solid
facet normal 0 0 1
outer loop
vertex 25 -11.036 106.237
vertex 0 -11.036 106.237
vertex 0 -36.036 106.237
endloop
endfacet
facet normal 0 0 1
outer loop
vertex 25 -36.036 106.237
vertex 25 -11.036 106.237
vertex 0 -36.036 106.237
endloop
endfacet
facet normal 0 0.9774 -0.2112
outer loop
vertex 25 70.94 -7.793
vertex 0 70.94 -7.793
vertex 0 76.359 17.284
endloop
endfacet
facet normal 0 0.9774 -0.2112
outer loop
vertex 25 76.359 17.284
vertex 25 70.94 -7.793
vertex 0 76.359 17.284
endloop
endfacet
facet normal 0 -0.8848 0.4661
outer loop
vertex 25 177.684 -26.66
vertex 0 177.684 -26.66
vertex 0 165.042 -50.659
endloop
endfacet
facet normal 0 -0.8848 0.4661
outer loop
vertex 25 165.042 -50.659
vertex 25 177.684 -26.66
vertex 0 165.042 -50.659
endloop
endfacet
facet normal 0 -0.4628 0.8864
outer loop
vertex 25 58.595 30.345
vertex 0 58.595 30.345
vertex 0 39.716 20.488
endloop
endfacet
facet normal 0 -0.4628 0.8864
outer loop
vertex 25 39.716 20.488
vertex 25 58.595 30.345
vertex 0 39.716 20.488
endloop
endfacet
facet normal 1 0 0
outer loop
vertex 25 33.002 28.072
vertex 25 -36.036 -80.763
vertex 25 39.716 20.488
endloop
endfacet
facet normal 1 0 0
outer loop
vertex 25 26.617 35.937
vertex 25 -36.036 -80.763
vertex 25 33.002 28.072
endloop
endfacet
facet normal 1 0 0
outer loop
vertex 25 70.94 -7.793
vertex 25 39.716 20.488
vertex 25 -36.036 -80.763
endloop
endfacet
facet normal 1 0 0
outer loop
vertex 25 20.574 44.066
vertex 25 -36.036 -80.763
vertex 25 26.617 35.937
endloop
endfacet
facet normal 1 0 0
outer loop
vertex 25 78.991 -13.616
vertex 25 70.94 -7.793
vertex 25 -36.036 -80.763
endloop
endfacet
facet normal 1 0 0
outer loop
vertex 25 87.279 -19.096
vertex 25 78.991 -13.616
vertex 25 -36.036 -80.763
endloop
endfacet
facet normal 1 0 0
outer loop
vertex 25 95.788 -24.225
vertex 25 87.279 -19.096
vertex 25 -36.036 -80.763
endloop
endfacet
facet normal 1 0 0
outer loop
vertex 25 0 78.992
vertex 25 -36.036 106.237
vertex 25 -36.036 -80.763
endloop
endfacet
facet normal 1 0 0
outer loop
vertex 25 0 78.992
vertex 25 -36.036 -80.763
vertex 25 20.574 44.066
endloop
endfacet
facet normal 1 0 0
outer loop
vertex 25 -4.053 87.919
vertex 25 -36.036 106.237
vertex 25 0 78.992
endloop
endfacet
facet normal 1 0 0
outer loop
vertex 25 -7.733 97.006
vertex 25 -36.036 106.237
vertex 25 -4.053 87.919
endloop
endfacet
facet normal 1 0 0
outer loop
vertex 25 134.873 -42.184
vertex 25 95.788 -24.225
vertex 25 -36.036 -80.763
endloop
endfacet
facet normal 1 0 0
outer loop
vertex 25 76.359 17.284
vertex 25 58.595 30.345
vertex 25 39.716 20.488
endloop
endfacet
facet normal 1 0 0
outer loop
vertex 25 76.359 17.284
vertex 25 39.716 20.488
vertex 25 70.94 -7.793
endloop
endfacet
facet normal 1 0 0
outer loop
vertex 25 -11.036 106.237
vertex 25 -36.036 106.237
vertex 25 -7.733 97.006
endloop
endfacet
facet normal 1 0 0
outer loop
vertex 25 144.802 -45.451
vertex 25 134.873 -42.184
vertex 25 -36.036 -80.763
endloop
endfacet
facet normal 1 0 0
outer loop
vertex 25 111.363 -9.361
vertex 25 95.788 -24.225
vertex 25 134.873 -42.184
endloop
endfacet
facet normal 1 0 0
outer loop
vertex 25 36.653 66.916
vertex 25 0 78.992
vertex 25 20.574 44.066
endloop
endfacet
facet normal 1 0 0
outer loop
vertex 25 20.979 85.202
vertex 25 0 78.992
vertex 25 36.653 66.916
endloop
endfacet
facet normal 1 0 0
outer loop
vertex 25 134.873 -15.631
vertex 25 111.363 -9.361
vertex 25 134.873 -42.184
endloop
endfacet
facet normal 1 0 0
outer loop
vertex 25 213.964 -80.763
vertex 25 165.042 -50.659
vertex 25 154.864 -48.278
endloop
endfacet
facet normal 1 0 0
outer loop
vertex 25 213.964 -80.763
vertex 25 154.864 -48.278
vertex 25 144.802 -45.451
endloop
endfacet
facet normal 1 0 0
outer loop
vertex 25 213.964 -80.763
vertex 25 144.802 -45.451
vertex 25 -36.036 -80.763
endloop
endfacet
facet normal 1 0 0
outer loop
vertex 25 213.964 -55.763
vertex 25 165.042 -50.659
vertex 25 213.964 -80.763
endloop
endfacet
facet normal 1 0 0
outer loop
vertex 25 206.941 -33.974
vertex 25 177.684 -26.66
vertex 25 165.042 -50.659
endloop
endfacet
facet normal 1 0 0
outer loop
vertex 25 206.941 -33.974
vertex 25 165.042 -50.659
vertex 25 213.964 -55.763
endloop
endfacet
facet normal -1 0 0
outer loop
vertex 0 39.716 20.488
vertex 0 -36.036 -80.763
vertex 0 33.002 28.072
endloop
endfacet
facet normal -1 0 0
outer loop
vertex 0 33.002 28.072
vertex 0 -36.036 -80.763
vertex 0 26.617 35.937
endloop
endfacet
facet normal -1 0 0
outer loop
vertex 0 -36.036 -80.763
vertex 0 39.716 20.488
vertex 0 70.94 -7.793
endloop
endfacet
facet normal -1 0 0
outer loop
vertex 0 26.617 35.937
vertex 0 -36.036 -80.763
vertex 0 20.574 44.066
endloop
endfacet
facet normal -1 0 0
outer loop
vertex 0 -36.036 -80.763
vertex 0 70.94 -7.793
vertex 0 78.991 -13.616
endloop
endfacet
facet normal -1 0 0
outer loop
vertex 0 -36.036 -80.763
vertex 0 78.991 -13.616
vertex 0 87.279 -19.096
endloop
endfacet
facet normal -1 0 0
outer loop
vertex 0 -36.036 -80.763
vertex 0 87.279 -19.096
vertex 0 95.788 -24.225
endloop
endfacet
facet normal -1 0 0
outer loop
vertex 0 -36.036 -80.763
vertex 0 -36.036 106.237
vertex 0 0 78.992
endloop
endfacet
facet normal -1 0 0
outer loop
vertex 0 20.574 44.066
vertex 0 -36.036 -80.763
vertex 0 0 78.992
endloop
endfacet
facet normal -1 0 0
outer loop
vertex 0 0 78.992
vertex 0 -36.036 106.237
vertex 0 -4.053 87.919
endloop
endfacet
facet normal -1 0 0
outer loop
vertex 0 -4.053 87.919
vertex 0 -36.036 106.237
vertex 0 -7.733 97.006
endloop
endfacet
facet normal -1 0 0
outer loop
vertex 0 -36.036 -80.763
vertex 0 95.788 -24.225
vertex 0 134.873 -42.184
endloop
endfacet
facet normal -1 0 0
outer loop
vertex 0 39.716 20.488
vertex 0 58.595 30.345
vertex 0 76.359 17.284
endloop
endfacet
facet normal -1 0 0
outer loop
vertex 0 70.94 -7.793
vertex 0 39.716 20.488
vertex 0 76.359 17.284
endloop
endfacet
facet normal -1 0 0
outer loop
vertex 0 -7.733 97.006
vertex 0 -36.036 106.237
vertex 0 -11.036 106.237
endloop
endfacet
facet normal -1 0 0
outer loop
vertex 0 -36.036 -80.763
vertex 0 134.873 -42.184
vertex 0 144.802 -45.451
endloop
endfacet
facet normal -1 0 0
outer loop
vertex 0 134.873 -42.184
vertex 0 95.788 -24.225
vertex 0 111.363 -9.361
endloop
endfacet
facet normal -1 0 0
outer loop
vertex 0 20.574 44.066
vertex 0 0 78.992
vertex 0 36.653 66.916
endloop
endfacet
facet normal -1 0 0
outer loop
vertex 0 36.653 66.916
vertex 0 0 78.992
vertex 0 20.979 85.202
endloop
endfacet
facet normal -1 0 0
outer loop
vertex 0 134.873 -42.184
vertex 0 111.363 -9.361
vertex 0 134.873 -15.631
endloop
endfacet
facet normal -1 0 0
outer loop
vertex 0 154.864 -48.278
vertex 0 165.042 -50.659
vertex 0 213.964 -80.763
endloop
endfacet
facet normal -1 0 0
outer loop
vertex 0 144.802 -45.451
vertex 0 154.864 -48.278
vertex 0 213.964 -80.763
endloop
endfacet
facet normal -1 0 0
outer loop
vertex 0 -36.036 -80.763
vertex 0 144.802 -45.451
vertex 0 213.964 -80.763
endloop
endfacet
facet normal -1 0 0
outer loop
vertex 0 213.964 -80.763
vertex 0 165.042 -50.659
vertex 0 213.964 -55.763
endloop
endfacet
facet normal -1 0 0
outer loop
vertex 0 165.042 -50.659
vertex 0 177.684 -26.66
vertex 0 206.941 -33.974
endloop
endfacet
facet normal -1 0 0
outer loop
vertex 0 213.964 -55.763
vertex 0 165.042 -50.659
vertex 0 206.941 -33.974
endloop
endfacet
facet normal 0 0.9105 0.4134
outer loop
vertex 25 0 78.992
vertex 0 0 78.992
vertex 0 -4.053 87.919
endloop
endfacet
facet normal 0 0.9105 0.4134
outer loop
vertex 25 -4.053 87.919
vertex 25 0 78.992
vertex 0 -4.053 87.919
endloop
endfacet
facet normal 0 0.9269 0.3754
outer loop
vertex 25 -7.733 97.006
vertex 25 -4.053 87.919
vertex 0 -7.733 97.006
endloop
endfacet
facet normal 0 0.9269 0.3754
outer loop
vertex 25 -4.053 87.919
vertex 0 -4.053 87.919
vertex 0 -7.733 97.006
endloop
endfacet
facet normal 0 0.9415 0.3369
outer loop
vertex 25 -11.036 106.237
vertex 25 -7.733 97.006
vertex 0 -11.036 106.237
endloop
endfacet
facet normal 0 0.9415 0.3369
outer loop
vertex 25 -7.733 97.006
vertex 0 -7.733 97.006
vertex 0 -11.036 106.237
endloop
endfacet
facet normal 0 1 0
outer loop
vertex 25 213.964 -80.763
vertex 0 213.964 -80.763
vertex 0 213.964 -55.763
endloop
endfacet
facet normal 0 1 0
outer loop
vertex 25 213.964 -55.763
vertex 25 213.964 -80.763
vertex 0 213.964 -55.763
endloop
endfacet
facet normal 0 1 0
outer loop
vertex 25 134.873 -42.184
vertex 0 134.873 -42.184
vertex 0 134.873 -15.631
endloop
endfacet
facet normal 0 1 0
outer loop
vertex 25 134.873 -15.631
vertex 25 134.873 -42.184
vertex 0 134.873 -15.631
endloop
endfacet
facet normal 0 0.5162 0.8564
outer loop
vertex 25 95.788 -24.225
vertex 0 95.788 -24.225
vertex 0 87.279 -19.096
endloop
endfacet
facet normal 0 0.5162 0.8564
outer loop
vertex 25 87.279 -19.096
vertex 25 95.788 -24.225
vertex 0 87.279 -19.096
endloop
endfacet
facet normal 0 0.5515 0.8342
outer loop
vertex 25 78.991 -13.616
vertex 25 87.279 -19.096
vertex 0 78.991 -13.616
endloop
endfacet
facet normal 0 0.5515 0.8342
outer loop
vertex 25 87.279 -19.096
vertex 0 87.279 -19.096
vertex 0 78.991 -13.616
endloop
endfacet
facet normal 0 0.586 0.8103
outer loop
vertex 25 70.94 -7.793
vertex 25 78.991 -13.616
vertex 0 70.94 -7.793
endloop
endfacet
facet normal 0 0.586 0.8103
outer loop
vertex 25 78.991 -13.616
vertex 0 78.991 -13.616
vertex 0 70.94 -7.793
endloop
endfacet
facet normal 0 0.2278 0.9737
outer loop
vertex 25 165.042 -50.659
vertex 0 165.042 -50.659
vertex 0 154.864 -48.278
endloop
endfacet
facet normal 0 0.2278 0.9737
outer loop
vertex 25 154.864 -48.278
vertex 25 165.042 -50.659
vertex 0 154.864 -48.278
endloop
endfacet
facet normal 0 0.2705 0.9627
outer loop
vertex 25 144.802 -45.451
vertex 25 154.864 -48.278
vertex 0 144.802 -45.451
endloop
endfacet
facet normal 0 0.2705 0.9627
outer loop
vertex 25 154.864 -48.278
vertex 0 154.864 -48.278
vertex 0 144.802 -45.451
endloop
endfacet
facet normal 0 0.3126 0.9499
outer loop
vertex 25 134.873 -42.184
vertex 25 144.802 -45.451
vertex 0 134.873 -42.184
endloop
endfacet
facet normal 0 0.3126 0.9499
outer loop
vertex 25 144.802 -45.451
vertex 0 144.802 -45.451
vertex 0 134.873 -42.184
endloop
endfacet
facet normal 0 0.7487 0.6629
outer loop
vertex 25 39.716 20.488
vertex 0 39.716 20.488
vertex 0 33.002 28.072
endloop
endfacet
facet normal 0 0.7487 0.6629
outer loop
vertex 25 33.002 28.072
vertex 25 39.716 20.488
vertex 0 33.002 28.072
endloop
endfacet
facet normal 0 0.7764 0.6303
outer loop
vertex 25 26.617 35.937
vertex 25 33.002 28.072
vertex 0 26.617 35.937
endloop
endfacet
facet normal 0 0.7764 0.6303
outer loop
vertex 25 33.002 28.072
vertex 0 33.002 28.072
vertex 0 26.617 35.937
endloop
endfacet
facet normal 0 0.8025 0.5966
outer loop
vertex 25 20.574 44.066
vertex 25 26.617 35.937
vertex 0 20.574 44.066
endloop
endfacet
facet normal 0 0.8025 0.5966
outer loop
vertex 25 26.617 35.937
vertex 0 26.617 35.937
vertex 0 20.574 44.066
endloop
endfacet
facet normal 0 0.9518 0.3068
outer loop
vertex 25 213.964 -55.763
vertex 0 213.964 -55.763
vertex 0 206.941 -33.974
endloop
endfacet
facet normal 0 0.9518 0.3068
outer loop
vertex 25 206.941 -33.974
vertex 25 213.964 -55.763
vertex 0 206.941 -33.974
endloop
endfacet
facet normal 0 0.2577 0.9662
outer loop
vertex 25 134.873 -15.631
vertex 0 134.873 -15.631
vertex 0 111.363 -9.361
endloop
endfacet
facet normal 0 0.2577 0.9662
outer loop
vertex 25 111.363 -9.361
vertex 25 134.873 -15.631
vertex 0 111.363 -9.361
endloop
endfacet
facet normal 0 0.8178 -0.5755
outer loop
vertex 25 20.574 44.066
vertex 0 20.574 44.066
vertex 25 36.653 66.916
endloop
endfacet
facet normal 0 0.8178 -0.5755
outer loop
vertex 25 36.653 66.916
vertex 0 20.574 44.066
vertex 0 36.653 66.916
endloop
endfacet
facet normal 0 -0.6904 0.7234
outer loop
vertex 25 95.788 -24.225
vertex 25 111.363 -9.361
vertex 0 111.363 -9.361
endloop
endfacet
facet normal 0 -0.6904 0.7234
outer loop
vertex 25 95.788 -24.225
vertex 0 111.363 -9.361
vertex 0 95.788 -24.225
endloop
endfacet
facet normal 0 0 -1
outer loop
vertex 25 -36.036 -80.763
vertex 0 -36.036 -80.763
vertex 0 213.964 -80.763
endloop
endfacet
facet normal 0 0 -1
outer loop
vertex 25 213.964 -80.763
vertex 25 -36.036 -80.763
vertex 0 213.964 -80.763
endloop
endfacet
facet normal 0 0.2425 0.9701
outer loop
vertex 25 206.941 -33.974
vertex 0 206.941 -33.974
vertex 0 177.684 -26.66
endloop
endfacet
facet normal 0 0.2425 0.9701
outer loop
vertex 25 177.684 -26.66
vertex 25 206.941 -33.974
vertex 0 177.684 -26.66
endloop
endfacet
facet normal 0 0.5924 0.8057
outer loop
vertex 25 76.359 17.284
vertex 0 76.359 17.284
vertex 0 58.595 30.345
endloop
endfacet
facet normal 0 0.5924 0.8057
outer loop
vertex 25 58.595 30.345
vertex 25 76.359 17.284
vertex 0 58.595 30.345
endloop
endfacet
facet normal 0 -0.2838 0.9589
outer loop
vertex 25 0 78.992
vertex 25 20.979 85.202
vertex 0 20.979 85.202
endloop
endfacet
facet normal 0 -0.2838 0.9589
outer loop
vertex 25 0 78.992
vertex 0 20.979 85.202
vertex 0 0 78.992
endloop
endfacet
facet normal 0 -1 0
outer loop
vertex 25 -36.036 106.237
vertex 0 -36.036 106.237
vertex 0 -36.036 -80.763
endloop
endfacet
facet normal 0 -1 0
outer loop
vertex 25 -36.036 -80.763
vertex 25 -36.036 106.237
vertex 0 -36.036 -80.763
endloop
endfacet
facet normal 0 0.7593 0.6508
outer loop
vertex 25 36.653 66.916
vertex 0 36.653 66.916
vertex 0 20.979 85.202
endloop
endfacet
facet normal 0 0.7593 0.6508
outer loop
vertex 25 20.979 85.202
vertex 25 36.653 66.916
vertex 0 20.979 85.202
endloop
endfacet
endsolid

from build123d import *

# Parameters (mm, degrees)
F1_DEPTH = 25


with BuildPart() as f1:
    # F0 (on Right) → F1 (new body)
    with BuildSketch(Plane.YZ):
        with BuildLine():
            Line((-36.035504, 106.236686), (-36.035504, -80.763314))
            Line((-36.035504, -80.763314), (213.964496, -80.763314))
            Line((213.964496, -80.763314), (213.964496, -55.763314))
            Line((213.964496, -55.763314), (206.940986, -33.974228))
            Line((206.940986, -33.974228), (177.683763, -26.659922))
            Line((177.683763, -26.659922), (165.041714, -50.65876))
            ThreePointArc((165.041714, -50.65876), (149.817431, -46.919692), (134.873256, -42.183545))
            Line((134.873256, -42.183545), (134.873256, -15.630545))
            Line((134.873256, -15.630545), (111.362994, -9.36128))
            Line((111.362994, -9.36128), (95.788479, -24.225105))
            ThreePointArc((95.788479, -24.225105), (83.106224, -16.399421), (70.940202, -7.793098))
            Line((70.940202, -7.793098), (76.35881, 17.283693))
            Line((76.35881, 17.283693), (58.595493, 30.344954))
            Line((58.595493, 30.344954), (39.715554, 20.487944))
            ThreePointArc((39.715554, 20.487944), (29.767414, 31.970469), (20.574449, 44.066057))
            Line((20.574449, 44.066057), (36.652576, 66.916481))
            Line((36.652576, 66.916481), (20.979062, 85.202247))
            Line((20.979062, 85.202247), (0, 78.992389))
            ThreePointArc((0, 78.992389), (-5.940015, 92.443497), (-11.035504, 106.236686))
            Line((-11.035504, 106.236686), (-36.035504, 106.236686))
        make_face()
    extrude(amount=F1_DEPTH)


solid = f1.part
